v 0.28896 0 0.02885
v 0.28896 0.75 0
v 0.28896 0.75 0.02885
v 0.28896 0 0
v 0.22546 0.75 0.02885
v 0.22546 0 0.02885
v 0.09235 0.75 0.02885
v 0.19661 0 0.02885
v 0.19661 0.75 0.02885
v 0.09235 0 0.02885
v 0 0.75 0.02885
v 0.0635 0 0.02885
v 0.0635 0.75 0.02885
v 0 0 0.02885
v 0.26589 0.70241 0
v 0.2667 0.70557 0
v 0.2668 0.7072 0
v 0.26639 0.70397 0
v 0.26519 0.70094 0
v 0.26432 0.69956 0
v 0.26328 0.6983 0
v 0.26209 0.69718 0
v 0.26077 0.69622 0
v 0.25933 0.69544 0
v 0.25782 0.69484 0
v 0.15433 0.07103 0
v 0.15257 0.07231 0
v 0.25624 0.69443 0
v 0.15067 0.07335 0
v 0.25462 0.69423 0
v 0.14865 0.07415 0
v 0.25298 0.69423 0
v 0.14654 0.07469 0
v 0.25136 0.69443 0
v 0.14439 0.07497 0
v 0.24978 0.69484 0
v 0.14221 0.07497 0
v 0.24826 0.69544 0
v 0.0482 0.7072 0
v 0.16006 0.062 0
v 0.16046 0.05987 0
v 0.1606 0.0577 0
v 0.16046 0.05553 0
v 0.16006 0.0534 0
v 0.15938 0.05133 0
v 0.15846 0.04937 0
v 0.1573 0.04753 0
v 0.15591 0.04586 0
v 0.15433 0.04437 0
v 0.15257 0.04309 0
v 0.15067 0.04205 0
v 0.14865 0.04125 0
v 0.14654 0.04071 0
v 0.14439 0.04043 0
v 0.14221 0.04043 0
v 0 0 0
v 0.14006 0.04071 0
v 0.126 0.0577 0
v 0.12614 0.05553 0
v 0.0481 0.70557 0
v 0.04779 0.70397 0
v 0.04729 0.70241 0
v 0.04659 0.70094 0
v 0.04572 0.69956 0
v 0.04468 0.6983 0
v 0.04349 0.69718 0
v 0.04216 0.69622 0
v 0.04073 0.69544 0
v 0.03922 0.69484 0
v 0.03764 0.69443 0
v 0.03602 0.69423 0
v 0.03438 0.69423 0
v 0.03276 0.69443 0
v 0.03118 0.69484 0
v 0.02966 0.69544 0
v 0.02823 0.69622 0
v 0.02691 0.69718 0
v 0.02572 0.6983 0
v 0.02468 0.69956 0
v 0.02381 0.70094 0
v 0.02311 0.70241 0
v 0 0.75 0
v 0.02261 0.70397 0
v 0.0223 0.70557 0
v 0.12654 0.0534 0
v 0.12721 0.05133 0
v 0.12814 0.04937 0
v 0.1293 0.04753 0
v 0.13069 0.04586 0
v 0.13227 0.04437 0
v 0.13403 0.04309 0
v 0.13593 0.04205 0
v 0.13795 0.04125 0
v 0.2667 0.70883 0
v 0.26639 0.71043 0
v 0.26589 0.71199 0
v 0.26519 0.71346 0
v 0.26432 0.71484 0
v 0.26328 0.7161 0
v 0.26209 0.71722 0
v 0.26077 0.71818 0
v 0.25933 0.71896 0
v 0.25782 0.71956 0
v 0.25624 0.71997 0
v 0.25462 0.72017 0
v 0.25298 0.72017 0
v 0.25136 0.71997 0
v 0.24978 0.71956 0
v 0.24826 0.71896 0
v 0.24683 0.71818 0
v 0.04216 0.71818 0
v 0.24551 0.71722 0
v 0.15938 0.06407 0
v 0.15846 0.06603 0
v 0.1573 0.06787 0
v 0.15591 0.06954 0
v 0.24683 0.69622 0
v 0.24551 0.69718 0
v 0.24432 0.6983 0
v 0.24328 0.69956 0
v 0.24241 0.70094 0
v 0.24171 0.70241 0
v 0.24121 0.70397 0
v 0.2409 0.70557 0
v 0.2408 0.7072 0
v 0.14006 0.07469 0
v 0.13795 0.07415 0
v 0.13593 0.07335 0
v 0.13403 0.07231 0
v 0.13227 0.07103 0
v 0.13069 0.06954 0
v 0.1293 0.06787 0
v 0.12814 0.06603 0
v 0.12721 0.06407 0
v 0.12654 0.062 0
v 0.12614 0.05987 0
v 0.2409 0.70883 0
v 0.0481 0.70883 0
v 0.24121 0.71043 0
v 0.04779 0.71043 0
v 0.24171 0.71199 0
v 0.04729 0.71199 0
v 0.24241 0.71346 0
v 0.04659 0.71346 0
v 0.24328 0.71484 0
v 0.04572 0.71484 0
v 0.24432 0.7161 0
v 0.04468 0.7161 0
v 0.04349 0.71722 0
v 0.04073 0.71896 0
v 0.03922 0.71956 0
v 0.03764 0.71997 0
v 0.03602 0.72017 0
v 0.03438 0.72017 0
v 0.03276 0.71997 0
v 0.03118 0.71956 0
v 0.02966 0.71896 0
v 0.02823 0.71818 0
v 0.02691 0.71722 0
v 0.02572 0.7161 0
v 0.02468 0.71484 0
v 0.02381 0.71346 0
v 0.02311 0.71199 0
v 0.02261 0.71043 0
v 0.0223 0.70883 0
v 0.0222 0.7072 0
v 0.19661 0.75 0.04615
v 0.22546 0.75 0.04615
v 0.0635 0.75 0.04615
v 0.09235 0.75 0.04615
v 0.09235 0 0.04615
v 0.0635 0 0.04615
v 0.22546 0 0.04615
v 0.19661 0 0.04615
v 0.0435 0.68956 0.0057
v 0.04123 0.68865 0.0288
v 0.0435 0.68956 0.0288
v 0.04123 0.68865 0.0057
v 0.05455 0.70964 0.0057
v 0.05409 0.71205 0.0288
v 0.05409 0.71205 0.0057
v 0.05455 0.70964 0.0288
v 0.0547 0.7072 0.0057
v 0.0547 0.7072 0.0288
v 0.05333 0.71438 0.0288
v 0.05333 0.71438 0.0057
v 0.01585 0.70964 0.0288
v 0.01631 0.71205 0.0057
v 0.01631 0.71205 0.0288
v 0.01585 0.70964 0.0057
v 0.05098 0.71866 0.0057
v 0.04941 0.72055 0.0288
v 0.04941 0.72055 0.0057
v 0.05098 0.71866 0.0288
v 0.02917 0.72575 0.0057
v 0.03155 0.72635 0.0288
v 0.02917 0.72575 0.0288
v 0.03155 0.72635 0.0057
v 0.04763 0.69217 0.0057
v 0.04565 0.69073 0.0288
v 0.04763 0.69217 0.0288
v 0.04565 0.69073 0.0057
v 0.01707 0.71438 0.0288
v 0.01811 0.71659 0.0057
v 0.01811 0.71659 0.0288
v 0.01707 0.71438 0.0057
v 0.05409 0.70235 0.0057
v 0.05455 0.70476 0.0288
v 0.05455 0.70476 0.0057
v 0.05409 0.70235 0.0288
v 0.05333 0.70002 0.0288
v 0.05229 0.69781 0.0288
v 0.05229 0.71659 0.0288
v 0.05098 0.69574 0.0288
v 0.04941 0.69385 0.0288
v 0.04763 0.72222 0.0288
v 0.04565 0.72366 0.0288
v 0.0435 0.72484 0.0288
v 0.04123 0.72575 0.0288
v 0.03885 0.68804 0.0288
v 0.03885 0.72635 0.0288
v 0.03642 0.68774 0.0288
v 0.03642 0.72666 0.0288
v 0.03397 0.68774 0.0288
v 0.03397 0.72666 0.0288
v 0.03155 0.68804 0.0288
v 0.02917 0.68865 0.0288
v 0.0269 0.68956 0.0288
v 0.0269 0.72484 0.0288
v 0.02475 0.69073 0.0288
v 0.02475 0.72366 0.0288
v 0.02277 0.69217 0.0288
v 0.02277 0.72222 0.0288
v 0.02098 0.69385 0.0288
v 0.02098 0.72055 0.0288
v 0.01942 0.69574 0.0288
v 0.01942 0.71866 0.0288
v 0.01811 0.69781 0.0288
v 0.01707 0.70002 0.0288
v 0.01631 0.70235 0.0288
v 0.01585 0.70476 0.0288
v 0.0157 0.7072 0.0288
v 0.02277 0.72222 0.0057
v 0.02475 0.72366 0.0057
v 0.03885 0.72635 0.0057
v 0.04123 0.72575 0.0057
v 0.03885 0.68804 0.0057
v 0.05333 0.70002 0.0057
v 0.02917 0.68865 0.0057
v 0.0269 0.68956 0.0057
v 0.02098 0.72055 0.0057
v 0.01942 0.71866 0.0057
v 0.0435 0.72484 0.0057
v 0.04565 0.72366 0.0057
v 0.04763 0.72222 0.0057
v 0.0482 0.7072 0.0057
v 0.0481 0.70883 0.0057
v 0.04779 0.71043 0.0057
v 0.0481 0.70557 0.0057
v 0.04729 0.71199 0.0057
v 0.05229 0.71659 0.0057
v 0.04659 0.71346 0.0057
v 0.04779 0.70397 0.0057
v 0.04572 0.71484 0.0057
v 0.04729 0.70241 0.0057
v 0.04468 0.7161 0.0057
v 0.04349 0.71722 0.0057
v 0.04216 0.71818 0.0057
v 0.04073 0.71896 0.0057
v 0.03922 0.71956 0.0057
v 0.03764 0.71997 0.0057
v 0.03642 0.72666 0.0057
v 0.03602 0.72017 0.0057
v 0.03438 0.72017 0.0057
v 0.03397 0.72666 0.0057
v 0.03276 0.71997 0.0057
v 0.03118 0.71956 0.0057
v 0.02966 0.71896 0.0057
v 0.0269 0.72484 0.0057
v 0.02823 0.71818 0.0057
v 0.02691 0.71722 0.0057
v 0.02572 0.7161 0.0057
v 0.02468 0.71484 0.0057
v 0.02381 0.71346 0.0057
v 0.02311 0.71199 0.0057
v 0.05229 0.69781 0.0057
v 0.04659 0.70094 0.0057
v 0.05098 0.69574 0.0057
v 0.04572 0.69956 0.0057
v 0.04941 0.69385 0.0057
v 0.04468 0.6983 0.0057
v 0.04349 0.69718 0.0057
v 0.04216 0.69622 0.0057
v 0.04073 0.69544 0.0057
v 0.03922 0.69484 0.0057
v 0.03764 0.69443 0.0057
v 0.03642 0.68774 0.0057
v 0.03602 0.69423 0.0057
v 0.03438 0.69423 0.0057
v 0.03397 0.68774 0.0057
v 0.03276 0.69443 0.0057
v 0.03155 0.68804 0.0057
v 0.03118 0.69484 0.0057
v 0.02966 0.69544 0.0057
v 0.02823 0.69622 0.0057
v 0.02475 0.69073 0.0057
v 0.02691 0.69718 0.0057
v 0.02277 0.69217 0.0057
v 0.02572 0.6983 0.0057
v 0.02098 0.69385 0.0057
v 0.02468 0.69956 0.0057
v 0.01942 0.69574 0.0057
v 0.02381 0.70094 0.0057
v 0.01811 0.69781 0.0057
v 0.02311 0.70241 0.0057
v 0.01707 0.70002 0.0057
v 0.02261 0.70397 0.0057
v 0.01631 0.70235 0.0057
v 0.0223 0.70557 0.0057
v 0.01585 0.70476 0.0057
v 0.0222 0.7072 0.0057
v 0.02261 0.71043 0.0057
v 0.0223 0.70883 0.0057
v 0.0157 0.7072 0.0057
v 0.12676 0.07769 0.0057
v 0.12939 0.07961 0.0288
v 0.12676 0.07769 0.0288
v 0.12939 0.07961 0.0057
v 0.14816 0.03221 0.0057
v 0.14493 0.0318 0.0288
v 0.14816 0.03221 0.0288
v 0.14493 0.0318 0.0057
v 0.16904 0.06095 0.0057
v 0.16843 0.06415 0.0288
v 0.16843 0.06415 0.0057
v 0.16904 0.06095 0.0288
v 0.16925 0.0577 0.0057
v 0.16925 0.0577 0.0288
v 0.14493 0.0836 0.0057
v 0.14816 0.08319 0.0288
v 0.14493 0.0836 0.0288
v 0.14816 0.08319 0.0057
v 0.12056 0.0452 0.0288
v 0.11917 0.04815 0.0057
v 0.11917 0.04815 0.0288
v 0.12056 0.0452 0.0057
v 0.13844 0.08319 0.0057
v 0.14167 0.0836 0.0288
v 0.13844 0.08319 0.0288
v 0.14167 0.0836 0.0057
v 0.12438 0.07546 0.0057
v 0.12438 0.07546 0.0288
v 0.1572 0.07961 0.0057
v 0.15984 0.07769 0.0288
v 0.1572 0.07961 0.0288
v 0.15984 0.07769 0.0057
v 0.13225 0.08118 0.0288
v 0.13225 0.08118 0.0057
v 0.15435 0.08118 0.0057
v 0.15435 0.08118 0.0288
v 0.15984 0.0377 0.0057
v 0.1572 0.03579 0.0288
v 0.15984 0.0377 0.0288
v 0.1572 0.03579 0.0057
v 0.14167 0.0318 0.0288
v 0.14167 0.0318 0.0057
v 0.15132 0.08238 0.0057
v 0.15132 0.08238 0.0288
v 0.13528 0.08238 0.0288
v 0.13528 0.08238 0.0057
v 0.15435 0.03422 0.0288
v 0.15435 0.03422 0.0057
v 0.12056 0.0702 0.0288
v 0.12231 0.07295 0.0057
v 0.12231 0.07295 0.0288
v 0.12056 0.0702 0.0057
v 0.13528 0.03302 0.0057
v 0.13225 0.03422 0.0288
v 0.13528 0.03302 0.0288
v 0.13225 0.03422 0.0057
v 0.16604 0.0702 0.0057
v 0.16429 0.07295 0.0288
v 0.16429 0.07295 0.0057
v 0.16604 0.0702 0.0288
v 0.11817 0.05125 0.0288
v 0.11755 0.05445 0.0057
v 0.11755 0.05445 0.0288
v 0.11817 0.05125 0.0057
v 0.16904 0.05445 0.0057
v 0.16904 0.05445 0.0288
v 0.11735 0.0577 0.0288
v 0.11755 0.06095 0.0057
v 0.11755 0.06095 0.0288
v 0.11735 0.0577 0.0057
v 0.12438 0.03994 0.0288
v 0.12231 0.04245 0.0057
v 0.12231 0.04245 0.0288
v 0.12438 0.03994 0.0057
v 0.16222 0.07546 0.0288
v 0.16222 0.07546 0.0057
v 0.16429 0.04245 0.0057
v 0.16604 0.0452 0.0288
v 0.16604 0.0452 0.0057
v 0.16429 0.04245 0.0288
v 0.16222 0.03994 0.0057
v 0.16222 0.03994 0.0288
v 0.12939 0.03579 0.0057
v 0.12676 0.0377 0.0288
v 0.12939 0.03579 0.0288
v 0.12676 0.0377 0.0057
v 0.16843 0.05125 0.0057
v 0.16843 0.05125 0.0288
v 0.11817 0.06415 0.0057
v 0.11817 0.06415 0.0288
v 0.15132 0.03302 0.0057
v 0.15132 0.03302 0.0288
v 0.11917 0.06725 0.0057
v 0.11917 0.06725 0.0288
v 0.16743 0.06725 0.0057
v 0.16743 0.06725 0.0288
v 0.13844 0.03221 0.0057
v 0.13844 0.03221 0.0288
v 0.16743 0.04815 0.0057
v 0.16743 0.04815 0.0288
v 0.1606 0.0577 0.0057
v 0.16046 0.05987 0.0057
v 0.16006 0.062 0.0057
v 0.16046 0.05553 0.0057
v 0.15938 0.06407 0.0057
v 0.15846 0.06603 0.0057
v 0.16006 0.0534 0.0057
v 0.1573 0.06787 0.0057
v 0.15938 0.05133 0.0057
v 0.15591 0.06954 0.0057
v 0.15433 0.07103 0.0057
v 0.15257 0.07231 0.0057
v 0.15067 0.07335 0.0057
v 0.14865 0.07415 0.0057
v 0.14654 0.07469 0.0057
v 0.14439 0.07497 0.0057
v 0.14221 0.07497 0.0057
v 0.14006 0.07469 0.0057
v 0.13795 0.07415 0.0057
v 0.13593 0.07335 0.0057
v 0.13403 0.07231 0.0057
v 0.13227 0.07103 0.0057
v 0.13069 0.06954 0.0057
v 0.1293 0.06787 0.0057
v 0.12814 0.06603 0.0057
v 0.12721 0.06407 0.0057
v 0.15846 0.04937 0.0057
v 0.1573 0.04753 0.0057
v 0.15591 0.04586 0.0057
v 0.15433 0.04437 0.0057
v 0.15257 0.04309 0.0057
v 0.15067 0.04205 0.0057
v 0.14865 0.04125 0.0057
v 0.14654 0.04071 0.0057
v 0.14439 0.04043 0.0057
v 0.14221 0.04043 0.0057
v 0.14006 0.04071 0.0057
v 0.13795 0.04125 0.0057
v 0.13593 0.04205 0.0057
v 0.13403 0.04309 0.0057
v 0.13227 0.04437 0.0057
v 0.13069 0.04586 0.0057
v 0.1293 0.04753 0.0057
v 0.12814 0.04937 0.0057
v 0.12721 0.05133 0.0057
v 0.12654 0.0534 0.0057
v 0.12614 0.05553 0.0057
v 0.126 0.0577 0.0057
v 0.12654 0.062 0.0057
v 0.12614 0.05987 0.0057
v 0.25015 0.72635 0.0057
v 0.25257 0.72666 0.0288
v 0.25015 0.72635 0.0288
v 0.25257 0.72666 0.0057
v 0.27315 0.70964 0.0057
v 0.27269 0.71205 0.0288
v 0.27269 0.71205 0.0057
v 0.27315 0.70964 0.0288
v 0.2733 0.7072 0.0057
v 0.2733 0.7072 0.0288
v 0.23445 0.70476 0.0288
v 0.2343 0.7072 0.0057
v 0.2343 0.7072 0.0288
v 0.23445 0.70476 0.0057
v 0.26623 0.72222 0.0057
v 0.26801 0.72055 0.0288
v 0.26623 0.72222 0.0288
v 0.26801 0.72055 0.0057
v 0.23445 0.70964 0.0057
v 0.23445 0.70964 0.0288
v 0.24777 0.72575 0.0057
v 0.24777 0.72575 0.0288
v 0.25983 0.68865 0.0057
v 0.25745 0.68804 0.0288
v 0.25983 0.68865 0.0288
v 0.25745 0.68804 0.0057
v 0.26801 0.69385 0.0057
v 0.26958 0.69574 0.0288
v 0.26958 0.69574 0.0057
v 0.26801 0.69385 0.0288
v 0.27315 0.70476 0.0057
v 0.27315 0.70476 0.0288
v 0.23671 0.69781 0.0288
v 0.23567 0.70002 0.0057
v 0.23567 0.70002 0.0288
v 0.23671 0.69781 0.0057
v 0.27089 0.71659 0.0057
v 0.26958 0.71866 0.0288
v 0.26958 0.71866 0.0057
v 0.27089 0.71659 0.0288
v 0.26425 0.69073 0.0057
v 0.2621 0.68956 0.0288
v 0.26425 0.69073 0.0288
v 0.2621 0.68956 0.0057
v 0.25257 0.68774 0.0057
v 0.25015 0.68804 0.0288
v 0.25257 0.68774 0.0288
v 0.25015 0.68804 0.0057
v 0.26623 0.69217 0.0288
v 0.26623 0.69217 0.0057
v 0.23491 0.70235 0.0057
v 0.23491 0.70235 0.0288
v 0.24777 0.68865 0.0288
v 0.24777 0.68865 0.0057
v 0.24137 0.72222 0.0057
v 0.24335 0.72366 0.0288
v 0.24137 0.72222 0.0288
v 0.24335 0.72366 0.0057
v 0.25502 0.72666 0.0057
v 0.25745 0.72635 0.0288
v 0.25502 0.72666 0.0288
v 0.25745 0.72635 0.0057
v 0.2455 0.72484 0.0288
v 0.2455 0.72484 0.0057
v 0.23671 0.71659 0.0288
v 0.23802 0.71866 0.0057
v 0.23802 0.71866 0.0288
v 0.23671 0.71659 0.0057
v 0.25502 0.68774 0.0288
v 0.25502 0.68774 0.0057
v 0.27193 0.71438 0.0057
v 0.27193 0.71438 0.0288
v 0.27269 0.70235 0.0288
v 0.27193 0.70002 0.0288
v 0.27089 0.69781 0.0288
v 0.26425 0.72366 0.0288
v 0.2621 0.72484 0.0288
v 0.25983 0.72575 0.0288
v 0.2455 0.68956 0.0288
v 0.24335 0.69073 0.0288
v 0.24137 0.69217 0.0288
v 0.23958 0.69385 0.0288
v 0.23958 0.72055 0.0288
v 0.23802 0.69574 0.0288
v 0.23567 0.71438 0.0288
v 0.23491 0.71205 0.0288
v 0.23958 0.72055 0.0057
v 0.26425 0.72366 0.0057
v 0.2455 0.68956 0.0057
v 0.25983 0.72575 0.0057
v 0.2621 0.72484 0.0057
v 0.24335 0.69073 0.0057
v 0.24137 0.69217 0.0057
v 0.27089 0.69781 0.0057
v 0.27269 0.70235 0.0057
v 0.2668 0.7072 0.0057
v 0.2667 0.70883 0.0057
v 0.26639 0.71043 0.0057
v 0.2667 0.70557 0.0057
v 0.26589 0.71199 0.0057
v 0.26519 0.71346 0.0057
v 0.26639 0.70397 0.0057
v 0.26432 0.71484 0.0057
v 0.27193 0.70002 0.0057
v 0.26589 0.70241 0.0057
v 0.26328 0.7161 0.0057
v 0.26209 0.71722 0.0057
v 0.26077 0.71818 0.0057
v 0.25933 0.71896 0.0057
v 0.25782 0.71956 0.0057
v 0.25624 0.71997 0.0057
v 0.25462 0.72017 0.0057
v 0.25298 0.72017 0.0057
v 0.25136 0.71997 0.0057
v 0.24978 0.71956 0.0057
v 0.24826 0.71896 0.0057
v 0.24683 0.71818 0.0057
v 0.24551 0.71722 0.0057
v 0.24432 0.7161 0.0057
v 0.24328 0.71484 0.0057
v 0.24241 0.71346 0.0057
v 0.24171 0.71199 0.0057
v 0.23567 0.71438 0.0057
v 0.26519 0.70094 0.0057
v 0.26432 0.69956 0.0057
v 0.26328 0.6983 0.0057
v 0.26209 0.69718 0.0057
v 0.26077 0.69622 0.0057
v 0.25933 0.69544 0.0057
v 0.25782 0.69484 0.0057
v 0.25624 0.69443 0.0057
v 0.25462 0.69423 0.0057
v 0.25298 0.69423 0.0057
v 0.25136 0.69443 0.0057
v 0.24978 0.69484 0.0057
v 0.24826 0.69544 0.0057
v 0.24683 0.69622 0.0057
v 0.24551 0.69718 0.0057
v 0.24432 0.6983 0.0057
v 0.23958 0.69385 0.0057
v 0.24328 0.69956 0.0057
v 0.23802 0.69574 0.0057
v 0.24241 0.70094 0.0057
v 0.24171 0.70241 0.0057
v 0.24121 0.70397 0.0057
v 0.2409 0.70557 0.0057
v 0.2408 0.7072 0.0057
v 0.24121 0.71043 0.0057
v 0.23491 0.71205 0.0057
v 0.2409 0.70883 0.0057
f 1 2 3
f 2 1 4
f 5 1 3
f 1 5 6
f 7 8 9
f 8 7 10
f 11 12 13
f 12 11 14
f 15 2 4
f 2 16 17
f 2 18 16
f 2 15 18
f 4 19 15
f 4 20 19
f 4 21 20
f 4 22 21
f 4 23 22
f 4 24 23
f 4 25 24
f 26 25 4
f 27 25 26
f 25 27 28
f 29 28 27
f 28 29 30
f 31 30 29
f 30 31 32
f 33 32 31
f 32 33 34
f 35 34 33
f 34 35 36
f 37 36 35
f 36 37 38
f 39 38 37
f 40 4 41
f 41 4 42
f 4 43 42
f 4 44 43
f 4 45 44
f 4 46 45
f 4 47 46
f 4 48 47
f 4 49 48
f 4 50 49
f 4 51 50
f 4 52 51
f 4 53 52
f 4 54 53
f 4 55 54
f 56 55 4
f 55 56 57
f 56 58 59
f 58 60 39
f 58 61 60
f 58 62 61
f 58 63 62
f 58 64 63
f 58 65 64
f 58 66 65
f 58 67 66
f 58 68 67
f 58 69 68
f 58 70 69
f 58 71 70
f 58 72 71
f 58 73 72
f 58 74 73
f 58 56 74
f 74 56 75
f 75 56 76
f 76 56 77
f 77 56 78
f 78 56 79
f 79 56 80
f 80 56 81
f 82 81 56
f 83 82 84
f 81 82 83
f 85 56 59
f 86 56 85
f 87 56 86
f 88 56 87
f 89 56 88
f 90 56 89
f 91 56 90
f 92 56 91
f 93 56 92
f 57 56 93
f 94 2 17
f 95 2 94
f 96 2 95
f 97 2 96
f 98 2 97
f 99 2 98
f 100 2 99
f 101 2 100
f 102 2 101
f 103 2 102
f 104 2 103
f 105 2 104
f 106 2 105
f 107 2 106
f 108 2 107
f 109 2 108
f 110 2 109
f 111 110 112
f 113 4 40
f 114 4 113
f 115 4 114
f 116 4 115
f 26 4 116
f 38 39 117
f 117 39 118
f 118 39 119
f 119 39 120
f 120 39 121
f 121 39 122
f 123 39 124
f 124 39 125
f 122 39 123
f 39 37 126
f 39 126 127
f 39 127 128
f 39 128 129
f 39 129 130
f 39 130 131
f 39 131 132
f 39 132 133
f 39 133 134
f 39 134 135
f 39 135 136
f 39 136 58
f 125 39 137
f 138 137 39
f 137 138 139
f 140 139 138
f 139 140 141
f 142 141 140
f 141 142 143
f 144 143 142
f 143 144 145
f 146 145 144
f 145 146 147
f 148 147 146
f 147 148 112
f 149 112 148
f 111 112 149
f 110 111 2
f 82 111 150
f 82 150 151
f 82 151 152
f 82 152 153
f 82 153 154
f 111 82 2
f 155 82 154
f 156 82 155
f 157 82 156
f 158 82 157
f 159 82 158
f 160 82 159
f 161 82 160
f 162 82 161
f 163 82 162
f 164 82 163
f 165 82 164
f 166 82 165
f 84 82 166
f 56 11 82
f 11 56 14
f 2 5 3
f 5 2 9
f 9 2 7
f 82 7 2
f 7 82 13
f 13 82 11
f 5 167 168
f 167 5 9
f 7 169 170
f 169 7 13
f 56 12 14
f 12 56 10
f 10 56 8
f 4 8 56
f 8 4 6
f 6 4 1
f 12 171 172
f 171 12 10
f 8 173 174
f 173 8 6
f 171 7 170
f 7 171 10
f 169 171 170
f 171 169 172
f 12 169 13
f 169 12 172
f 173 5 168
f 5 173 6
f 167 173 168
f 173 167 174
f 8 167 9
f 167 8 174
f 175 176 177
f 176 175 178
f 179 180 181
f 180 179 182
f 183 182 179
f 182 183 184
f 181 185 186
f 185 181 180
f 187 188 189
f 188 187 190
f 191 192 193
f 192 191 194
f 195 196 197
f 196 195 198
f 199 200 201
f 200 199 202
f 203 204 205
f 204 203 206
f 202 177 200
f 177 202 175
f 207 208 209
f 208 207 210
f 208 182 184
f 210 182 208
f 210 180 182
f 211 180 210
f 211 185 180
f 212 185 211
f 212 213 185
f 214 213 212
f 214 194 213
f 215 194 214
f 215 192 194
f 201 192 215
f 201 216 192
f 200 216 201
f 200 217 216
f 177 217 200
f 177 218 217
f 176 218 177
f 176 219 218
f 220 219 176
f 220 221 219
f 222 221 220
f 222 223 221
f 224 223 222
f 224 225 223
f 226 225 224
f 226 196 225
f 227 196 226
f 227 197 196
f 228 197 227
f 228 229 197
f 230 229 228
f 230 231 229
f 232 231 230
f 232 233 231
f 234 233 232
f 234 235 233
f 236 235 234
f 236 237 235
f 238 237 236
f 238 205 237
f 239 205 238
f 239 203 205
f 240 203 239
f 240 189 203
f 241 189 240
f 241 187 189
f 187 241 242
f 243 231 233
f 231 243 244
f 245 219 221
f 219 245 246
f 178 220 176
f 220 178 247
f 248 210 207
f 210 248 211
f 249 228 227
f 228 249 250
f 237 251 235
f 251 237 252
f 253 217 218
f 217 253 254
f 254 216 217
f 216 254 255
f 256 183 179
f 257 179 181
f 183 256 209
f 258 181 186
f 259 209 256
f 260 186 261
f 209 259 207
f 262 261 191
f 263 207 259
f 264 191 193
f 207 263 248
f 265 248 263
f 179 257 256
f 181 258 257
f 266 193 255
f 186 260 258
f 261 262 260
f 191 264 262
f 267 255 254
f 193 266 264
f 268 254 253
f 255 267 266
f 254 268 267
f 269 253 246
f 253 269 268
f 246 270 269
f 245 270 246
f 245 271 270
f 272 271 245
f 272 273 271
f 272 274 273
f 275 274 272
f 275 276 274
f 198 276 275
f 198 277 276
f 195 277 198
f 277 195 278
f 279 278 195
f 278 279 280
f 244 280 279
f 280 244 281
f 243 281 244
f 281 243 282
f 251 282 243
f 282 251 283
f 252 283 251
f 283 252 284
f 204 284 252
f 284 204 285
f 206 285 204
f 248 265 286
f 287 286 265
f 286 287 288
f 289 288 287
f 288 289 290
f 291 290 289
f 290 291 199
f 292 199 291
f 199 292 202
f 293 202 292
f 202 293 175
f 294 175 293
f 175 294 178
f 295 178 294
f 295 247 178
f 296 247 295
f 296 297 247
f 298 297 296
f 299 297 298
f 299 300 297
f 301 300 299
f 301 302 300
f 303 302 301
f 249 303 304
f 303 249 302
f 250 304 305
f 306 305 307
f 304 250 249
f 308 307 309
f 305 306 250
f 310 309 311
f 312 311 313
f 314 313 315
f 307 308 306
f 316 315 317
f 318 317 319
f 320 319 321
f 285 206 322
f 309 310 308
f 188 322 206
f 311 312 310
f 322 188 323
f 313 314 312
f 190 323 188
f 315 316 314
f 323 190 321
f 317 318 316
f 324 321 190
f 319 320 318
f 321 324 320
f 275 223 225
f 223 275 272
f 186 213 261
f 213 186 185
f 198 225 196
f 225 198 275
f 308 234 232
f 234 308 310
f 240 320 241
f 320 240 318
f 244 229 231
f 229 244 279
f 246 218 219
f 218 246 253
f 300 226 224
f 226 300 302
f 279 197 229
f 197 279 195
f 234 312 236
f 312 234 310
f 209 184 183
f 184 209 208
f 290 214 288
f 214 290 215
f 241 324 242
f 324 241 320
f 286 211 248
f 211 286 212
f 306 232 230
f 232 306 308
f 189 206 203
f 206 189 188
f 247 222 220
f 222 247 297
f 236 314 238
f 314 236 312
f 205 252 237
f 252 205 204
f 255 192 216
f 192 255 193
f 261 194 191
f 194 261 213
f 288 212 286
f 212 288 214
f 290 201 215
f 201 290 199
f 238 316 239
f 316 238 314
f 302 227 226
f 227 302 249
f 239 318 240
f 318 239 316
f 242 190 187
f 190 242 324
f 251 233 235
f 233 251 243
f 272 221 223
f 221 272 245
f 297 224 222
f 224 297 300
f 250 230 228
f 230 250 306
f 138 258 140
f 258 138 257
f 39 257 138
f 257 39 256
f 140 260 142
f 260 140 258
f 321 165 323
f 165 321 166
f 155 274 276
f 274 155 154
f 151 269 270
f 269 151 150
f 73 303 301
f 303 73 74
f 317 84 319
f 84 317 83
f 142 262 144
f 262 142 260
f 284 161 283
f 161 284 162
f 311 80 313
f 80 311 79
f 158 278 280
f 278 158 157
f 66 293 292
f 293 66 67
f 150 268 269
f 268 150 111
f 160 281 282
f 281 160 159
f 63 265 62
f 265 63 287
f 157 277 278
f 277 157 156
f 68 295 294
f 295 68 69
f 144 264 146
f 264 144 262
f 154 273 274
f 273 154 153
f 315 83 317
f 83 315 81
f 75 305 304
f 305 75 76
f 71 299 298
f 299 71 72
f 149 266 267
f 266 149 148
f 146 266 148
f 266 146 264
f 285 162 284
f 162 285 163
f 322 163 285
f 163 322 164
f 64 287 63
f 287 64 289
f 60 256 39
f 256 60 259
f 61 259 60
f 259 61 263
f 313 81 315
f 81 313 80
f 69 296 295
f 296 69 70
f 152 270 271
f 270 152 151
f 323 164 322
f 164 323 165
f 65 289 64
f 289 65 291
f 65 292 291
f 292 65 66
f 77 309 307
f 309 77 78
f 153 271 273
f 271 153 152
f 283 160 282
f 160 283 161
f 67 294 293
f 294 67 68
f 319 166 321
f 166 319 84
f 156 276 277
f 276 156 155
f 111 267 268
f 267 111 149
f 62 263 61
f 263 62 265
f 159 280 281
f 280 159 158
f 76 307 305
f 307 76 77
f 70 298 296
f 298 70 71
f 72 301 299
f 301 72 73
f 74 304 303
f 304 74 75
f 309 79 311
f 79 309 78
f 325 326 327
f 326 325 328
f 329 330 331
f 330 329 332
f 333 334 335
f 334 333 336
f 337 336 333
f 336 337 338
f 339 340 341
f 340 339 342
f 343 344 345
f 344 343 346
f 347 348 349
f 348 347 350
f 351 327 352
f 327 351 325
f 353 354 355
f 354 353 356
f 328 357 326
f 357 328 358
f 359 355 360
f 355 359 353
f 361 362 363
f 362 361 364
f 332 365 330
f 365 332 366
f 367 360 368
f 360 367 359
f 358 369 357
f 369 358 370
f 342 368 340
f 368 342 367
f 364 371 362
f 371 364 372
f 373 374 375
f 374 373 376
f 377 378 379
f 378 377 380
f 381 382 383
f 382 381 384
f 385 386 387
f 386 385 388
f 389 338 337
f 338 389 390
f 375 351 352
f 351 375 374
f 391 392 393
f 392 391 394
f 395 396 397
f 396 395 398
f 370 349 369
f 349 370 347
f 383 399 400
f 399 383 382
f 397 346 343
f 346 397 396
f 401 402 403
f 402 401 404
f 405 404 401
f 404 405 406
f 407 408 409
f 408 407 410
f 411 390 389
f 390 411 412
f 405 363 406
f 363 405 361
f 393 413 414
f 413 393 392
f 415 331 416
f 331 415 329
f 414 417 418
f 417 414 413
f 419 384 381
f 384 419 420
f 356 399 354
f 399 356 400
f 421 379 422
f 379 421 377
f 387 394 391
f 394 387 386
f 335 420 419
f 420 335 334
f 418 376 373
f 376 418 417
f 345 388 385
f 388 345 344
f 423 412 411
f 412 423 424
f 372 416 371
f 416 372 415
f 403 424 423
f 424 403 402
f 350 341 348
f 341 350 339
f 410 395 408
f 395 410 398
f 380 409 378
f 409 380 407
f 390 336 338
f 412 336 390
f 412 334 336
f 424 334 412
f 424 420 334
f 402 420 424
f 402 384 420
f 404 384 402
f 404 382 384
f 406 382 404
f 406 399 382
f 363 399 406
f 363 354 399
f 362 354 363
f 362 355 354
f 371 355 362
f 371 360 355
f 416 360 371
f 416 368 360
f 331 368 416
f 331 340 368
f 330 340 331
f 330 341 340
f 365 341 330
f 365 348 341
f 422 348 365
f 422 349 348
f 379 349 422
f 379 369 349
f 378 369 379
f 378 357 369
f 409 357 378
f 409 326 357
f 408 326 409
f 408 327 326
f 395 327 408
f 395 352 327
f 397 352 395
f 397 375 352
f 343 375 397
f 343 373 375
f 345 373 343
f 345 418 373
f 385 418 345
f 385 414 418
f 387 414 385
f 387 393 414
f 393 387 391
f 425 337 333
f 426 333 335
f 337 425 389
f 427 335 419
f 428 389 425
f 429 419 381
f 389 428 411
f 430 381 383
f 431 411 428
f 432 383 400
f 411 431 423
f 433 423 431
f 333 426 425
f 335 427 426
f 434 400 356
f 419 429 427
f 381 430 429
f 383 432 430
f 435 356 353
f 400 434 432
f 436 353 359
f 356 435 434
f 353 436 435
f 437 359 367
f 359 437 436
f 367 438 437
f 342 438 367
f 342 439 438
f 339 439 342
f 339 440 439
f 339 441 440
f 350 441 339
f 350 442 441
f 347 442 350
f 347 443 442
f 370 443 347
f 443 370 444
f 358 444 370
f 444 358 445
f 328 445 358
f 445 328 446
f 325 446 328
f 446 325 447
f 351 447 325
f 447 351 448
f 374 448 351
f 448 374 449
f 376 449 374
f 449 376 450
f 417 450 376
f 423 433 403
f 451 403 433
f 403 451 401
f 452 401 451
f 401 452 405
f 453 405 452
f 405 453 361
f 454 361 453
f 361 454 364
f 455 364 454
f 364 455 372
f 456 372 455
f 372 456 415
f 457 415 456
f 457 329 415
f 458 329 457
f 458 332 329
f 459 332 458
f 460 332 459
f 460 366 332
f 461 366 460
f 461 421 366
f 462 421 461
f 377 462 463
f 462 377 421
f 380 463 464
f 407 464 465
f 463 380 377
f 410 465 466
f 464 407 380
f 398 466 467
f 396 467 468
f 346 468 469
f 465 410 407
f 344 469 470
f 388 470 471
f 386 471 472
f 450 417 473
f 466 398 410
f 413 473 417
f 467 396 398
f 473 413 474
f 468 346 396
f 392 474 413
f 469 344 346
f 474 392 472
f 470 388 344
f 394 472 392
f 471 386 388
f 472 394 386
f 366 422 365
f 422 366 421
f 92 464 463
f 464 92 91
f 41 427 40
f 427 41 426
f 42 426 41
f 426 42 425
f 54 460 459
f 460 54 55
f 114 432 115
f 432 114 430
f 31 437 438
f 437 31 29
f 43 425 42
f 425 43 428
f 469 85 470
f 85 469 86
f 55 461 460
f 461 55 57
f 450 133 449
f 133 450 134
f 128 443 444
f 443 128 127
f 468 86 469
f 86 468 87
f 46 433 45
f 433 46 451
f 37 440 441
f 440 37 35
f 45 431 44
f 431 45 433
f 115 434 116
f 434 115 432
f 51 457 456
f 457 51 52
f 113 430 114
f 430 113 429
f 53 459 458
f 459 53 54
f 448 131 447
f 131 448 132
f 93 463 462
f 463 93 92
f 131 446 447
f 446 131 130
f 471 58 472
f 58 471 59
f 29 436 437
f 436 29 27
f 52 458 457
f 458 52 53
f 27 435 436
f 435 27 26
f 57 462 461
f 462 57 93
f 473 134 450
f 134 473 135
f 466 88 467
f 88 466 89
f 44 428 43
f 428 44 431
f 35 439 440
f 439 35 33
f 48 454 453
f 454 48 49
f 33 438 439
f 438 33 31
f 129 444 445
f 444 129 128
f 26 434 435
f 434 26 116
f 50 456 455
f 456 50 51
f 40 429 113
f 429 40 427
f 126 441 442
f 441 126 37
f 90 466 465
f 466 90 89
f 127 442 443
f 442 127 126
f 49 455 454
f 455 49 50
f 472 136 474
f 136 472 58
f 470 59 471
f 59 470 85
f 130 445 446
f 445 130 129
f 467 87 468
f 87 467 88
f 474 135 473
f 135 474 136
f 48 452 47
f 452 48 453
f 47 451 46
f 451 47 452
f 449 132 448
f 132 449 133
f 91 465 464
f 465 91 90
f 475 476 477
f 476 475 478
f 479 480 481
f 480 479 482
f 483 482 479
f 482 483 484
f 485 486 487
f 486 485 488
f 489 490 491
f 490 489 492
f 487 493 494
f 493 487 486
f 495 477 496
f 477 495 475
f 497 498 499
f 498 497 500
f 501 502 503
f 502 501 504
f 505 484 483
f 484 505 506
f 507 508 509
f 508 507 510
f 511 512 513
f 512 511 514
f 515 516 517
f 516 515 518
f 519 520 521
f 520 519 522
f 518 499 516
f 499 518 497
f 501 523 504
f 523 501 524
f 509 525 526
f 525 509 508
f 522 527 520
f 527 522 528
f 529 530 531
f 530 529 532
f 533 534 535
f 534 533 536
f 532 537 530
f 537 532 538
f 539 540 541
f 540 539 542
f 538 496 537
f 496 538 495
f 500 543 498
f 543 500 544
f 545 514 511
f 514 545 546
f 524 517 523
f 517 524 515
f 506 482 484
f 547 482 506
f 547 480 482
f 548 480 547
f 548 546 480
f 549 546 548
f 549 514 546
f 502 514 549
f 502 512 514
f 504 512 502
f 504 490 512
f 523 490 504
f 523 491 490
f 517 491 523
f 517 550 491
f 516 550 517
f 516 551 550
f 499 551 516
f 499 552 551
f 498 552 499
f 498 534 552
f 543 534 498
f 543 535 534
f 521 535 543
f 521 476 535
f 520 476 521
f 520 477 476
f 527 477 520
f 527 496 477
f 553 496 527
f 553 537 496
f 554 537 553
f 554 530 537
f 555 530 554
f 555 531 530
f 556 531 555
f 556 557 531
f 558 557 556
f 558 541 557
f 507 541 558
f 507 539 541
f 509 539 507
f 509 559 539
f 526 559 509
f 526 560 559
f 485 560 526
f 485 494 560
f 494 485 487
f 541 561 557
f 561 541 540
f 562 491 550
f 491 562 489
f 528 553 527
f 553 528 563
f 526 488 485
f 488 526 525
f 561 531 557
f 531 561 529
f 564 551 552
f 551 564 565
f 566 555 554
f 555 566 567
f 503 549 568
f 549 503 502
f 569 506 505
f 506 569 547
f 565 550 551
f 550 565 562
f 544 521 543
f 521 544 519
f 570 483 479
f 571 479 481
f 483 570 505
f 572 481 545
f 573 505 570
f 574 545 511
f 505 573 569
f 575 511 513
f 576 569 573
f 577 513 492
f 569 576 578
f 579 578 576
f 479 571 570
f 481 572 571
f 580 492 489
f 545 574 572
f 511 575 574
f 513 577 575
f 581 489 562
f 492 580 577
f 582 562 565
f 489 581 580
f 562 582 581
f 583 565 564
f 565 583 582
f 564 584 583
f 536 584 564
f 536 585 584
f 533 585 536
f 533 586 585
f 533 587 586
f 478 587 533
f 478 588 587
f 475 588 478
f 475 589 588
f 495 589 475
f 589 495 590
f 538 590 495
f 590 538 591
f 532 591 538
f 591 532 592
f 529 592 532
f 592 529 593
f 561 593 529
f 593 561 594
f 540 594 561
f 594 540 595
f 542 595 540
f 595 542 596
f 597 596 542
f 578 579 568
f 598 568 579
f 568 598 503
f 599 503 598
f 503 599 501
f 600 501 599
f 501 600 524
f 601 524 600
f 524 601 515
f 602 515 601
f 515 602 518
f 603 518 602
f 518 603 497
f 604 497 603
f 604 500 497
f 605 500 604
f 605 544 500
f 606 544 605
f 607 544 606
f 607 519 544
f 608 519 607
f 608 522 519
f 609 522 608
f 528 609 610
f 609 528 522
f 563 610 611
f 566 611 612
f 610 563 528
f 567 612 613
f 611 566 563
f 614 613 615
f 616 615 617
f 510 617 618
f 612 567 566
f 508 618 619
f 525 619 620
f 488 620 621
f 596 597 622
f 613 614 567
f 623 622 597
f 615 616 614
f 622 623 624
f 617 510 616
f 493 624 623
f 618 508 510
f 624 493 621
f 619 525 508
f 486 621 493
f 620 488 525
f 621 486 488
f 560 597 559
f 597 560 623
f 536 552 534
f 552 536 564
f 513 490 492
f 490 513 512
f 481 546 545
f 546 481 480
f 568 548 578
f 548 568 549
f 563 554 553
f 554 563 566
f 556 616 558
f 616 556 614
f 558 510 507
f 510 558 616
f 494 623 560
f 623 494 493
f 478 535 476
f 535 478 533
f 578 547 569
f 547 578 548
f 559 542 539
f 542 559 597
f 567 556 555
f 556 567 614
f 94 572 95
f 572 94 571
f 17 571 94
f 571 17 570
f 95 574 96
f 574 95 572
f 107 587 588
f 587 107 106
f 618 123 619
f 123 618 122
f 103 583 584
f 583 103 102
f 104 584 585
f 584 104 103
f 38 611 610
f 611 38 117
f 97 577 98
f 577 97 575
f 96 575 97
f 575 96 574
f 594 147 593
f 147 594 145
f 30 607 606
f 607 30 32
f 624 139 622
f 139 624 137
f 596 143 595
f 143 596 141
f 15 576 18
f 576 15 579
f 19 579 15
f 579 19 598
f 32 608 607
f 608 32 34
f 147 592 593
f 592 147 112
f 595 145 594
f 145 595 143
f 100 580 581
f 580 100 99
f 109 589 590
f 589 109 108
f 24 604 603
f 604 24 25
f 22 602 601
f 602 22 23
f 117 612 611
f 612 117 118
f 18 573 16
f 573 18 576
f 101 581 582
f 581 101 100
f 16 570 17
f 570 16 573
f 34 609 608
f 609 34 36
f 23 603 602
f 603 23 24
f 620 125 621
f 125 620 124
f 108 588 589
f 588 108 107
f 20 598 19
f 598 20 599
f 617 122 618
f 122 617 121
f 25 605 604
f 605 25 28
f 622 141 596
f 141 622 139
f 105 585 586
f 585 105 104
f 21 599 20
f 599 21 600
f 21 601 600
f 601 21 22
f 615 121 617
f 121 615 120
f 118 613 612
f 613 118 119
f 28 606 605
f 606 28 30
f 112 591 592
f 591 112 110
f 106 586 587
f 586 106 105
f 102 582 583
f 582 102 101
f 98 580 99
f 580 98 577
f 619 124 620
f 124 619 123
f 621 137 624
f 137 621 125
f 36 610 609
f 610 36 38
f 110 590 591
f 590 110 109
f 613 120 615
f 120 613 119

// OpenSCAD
// Parametric dimensions (inches)
$fn = 50;

// Base solid
base_length  = 0.28896;
base_width   = 0.75;
base_height  = 0.028846;          // top face Z = base_height

// Ribs on top face
rib_height   = 0.017308;          // rise above base top
rib_edge_offset = 0.0635;         // left/right offset from base edges

// Two rib widths (equal); gap will be computed to fill the footprint
rib_width = 0.028846;             // same as base_height as a visual choice

// Footprint of rib array
footprint_x = base_length - 2 * rib_edge_offset;
rib_gap     = footprint_x - 2 * rib_width;

// Hole positions and radii (X from left edge, Y from front edge)
hole_specs = [
    [0.0352, 0.7072, 0.013],
    [0.1433, 0.0577, 0.0173],
    [0.2538, 0.7072, 0.013]
];

// Vertical stages common to all holes
recess_bottom_z = 0.0057;        // from base underside (Z=0)
recess_top_z    = 0.0288;
recess_height   = recess_top_z - recess_bottom_z;

deep_bottom_z   = -0.1154;
deep_top_z      = 0.0288;
deep_height     = deep_top_z - deep_bottom_z;

// Counterbore enlargement factor (recess radius = hole_radius * factor)
recess_radius_factor = 1.5;

// ------------------------------------------------------------
module base_with_ribs() {
    // Main plate
    cube([base_length, base_width, base_height]);
    
    // Left rib
    translate([rib_edge_offset, 0, base_height])
        cube([rib_width, base_width, rib_height]);
    // Right rib
    translate([rib_edge_offset + rib_width + rib_gap, 0, base_height])
        cube([rib_width, base_width, rib_height]);
}

module stepped_hole(x, y, hole_r) {
    recess_r = hole_r * recess_radius_factor;
    
    translate([x, y, recess_bottom_z])
        cylinder(r = recess_r, h = recess_height);
    
    translate([x, y, deep_bottom_z])
        cylinder(r = hole_r, h = deep_height);
}

difference() {
    base_with_ribs();
    for (spec = hole_specs) {
        stepped_hole(spec[0], spec[1], spec[2]);
    }
}
